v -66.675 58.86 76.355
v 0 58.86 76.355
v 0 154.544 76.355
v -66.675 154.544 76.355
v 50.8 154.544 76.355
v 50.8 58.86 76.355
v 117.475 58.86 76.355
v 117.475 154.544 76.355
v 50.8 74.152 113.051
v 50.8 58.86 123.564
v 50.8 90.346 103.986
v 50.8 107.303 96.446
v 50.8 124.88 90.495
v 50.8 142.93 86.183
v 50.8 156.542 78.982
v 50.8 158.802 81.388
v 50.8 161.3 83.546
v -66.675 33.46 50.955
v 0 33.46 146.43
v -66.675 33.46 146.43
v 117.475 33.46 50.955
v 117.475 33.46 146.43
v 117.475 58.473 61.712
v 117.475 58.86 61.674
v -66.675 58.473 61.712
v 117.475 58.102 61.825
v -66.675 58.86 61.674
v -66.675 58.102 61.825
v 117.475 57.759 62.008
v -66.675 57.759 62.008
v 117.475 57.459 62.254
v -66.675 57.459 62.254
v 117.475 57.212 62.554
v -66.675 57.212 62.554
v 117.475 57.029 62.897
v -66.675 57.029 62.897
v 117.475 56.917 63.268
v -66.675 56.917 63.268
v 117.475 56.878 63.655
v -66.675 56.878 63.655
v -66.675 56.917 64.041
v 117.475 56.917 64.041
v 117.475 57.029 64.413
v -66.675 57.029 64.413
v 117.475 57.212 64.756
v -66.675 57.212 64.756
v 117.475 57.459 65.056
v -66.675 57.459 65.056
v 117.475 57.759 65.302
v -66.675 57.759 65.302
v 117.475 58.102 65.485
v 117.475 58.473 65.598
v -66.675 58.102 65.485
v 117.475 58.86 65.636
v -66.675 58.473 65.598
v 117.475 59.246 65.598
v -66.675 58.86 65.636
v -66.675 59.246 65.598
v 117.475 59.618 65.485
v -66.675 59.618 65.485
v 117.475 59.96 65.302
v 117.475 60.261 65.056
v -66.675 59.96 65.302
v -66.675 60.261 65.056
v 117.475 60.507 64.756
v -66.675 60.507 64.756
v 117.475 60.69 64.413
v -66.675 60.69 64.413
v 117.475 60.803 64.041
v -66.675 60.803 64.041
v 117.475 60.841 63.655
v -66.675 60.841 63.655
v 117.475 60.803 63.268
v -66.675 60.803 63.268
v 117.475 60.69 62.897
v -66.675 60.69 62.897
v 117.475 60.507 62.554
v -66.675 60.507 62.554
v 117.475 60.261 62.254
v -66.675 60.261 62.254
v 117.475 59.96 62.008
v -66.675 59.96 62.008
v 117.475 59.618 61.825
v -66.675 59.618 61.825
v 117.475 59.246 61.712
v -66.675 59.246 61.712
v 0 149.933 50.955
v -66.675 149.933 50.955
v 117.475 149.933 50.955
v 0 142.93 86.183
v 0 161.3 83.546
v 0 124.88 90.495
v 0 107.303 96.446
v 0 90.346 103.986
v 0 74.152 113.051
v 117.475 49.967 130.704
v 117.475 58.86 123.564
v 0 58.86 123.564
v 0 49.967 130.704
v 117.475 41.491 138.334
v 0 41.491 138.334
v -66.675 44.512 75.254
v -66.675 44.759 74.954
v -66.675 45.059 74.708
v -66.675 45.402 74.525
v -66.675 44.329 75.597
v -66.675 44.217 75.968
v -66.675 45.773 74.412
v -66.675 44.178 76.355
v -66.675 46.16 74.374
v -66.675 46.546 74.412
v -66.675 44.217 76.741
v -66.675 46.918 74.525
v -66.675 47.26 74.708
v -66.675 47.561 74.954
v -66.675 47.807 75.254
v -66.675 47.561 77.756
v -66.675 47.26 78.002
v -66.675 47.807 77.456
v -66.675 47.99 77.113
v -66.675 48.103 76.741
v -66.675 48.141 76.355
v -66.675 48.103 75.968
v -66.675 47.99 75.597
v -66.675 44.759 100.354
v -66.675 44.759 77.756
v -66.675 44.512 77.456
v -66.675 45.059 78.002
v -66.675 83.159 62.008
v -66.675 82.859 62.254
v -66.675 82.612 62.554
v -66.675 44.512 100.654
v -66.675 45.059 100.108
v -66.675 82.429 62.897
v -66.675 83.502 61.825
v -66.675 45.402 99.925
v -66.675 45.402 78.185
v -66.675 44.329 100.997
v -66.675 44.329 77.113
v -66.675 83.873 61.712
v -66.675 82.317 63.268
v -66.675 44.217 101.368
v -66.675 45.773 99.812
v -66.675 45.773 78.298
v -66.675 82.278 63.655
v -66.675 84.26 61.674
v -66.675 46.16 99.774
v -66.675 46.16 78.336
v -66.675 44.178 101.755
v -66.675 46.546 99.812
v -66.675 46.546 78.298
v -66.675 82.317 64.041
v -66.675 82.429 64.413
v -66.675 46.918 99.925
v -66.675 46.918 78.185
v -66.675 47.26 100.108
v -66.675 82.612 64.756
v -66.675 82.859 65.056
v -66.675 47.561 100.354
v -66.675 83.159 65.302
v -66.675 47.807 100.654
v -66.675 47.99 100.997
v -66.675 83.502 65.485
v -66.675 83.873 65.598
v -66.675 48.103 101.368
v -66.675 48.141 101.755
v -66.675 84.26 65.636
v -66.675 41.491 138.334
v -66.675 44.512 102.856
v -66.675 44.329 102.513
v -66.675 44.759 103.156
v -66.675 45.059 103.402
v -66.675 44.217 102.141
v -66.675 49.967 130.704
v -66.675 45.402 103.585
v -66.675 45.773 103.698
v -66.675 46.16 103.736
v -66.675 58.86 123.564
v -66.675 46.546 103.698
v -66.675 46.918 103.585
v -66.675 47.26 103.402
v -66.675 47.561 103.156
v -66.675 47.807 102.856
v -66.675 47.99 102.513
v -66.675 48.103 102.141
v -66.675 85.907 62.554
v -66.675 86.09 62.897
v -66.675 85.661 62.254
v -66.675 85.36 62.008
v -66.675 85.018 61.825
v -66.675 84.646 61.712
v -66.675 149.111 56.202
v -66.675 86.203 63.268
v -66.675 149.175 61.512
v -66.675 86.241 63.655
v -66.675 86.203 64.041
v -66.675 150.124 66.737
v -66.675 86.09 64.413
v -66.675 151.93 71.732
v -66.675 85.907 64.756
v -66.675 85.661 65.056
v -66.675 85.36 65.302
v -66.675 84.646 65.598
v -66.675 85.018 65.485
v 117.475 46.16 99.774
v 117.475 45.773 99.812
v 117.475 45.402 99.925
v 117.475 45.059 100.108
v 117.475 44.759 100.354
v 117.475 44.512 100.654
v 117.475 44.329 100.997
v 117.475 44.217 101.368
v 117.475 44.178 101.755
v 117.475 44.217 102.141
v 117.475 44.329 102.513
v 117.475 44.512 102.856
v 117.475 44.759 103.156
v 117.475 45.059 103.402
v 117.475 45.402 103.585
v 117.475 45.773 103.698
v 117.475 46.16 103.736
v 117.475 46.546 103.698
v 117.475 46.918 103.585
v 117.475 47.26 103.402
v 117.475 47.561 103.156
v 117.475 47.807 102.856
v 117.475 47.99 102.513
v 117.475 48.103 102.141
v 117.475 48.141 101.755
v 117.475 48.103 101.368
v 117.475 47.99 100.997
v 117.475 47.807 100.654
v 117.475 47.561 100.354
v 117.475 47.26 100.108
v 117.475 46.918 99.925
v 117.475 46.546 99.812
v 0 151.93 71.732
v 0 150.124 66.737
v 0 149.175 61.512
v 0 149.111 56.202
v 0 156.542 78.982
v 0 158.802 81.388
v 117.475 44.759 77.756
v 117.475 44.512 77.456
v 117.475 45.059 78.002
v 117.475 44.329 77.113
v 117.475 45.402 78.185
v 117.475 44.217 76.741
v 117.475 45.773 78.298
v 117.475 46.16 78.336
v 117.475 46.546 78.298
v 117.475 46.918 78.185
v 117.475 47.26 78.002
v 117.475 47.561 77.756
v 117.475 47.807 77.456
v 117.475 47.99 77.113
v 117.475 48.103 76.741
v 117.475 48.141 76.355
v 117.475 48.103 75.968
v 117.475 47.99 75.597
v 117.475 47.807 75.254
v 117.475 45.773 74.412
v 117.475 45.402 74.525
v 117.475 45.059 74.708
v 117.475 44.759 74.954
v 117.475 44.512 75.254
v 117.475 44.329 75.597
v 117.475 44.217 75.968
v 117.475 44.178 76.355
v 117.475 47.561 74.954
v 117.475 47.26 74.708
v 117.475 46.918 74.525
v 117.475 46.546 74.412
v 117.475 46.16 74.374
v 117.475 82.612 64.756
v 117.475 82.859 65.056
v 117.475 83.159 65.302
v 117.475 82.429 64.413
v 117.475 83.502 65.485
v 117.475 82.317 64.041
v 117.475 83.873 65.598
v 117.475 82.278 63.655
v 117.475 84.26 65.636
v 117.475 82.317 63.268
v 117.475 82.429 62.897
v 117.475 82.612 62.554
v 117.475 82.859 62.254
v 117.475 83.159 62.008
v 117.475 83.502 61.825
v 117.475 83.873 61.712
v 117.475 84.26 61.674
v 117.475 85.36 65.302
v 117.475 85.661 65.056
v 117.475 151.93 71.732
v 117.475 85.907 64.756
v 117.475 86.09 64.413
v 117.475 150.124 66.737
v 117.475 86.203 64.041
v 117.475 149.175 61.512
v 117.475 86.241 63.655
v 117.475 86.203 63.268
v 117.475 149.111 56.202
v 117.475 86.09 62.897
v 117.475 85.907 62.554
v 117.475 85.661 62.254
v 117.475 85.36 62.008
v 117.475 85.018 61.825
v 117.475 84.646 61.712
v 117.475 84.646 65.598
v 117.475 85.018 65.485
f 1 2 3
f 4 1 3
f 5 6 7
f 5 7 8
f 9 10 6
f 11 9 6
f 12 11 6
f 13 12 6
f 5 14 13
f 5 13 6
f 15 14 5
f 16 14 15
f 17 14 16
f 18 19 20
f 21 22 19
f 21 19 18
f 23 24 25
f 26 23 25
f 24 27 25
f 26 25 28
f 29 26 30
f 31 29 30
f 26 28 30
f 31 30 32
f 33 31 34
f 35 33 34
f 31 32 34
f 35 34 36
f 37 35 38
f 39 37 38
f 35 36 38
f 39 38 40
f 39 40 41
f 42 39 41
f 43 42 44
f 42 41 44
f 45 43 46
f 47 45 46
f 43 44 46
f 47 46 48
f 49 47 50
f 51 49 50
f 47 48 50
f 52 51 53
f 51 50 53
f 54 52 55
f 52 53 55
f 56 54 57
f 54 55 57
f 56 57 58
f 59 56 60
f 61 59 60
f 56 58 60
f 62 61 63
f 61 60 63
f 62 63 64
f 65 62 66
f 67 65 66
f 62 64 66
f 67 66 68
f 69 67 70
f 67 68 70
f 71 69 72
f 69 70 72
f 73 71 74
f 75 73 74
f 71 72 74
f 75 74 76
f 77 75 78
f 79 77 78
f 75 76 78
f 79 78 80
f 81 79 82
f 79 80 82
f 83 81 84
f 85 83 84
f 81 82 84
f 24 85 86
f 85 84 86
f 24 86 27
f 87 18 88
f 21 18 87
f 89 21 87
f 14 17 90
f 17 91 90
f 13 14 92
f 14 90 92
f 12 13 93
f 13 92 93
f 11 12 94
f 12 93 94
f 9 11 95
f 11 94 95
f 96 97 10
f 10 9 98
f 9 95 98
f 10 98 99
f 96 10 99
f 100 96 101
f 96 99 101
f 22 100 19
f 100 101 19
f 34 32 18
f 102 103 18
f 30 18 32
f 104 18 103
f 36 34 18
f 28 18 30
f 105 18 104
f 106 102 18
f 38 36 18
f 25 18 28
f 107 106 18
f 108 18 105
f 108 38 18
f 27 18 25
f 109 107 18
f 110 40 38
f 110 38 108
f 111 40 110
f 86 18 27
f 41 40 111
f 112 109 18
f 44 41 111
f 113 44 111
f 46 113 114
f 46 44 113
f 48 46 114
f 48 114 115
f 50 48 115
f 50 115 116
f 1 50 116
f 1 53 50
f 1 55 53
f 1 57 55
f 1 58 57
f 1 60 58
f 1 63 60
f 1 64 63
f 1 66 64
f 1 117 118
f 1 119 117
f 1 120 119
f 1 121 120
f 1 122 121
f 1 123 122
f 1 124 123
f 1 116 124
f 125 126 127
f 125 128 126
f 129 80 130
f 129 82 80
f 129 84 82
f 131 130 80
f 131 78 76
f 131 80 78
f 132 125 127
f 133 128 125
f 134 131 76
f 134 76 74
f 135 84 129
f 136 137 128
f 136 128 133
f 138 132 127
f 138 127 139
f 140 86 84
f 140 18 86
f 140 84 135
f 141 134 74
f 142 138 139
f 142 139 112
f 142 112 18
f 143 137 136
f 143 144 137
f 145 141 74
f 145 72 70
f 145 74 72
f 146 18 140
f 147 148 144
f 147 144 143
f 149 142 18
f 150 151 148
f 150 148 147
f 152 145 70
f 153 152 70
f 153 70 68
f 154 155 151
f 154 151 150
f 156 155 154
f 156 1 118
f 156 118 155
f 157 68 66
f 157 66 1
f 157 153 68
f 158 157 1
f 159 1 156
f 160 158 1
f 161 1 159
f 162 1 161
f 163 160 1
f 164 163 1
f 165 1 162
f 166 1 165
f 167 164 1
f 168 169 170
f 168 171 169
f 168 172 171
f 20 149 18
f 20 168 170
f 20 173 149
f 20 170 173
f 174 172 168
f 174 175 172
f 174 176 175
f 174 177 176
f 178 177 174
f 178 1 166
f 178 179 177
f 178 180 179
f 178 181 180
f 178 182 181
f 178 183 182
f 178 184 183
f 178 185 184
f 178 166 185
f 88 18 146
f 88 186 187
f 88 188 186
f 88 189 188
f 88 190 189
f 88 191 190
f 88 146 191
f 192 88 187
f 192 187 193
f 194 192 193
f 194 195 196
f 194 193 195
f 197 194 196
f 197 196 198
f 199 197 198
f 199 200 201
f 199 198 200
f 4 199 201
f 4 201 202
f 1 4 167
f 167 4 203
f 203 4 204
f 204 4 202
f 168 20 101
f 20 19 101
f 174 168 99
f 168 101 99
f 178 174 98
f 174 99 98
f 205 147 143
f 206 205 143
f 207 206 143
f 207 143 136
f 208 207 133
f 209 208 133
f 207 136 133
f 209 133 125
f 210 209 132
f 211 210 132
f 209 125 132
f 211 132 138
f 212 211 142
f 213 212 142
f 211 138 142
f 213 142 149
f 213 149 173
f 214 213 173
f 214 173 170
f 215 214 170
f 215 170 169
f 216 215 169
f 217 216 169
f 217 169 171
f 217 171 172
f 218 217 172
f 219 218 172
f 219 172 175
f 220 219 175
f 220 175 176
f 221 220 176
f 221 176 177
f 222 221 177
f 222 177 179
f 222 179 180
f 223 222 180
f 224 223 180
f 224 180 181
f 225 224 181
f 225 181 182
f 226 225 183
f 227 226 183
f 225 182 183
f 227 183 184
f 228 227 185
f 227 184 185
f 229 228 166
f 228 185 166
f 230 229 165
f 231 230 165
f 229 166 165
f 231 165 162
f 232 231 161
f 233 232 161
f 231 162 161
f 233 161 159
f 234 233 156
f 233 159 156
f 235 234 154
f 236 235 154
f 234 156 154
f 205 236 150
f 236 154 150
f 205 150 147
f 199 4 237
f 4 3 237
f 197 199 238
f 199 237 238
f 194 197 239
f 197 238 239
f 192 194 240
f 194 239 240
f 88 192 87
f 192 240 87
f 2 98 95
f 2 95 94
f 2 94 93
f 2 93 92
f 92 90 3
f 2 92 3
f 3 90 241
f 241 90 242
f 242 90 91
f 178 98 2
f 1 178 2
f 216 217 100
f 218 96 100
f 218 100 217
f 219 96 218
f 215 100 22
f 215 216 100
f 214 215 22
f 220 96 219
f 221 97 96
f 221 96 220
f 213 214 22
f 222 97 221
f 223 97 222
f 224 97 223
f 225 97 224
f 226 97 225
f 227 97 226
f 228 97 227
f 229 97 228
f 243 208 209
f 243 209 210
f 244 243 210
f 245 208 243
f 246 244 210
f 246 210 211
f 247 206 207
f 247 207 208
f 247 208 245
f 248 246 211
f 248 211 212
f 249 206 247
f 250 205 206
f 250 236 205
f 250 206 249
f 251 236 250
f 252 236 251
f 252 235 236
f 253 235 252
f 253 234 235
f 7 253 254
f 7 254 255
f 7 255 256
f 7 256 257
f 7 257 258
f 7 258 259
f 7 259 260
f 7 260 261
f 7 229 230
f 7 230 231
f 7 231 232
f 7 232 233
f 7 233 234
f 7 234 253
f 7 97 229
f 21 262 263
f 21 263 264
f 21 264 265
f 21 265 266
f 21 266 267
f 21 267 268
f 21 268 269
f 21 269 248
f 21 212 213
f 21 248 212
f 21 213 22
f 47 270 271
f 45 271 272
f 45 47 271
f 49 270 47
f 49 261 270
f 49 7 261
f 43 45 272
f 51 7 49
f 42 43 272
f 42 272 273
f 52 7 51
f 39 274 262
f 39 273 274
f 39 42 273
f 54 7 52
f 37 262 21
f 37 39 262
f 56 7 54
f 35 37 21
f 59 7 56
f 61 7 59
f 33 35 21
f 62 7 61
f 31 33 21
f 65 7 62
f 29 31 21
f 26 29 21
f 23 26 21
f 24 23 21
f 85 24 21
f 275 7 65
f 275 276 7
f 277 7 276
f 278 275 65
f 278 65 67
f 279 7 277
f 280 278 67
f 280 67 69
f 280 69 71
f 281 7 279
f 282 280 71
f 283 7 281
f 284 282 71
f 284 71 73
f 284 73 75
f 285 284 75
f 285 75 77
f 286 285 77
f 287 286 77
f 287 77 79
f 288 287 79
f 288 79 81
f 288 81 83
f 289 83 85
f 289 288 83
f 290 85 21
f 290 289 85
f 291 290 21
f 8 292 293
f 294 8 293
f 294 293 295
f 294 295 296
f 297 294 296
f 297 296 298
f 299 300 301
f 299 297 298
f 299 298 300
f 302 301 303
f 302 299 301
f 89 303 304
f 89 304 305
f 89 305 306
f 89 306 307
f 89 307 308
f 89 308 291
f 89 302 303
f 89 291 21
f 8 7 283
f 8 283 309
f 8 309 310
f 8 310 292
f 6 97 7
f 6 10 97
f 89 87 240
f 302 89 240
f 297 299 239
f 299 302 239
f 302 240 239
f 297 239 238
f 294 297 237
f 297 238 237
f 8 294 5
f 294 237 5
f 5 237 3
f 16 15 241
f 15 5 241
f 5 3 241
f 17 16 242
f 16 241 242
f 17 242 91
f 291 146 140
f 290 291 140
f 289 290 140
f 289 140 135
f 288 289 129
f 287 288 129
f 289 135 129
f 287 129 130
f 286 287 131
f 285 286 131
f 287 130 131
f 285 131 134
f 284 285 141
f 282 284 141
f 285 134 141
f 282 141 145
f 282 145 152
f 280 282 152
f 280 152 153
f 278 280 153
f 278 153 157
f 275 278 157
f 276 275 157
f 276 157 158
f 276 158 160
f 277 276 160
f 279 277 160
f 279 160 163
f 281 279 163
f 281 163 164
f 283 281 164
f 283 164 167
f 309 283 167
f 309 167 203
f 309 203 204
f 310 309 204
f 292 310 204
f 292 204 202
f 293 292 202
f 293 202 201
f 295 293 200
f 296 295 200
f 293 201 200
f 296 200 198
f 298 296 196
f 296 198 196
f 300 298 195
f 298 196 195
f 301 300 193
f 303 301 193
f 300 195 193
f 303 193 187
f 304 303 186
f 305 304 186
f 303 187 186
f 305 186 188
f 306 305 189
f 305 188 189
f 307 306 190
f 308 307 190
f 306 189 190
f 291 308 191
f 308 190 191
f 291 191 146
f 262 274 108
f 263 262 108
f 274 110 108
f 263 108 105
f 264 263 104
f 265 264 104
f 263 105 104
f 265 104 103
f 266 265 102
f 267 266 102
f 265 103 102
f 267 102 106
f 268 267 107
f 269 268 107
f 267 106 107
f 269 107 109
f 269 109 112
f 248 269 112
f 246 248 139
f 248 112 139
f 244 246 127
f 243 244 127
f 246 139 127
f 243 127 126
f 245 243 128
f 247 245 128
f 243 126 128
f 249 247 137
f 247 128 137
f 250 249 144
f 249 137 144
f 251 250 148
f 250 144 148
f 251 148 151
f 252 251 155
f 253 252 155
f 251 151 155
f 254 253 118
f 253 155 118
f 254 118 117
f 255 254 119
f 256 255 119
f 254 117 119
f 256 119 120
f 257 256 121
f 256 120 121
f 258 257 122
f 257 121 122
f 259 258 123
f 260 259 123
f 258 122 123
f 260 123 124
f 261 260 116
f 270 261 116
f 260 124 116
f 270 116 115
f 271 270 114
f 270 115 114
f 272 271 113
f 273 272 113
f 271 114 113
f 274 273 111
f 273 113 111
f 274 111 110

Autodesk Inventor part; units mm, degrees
ref_plane "YZ Plane" through (0, 0, 0) normal (1, 0, 0) x (0, 1, 0)
ref_plane "XZ Plane" through (0, 0, 0) normal (0, 1, 0) x (-1, 0, 0)
ref_plane "XY Plane" through (0, 0, 0) normal (0, 0, 1) x (1, 0, 0)
sketch "Sketch1" plane through (0, 0, 0) normal (1, 0, 0) x (0, 1, 0)
  circle A0 centre (180.7797, 284.5338) radius 25.4
  line L0 (-17.3403, 309.9338) -> (-51.2615, 309.9338)
  line L1 (-51.2615, 309.9338) -> (-51.2615, -502.8662)
  line L2 (-51.2615, -502.8662) -> (-17.3403, -502.8662)
  line L3 (-17.3403, -502.8662) -> (-17.3403, 309.9338)
  line L4 (33.4597, 146.4304) -> (33.4597, 50.9549)
  arc A1 (202.8525, 71.0418) -> (198.1508, 77.005) centre (180.7797, 58.4738) ccw
  line L5 (198.1508, 7.6738) -> (231.5797, 7.6738)
  line L6 (231.5797, 7.6738) -> (231.5797, 309.9338)
  line L7 (231.5797, 309.9338) -> (33.4597, 309.9338)
  line L8 (33.4597, 146.4304) -> (33.4597, 50.9549)
  line L9 (198.1508, 76.3549) -> (198.1508, 50.9549)
  line L10 (33.4597, 50.9549) -> (33.4597, 76.3549)
  line L11 (33.4597, 50.9549) -> (58.8597, 50.9549)
  line L12 (33.4597, 119.3221) -> (33.4597, 50.9549)
  line L13 (149.9329, 50.9549) -> (33.4597, 50.9549)
  arc A2 (231.5797, 89.0982) -> (-17.3403, 245.4929) centre (180.7797, 284.5338) ccw
  arc A3 (33.4597, 146.4304) -> (161.2998, 83.5456) centre (180.7797, 284.5338) ccw
  arc A4 (161.2998, 83.5456) -> (149.9329, 50.9549) centre (180.7797, 58.4738) ccw
  arc A5 (198.1508, 70.6079) -> (202.8525, 71.0418) centre (180.7797, 284.5338) ccw
  arc A6 (231.5797, 76.0023) -> (-17.3403, 201.9838) centre (180.7797, 284.5338) ccw
  point P0 (0, 0)
  dimension "d1" = 50.8
  dimension "d2" = 812.8
  dimension "d5" = 25.4
  dimension "d6" = 198.12
  dimension "d10" = 50.8
  dimension "d11" = 50.8
  dimension "d12" = 226.06
  dimension "d15" = 25.4
  dimension "d16" = 50.8
  dimension "d17" = 302.26
  dimension "d18" = 50.8
extrude "Extrusion1" add sketch "Sketch1" along normal blind 50.8 contours A3 A4 L13 L11 L4
sketch "Sketch2" plane through (50.8, 0, 0) normal (1, 0, 0) x (0, 0, -1)
  line L0 (-146.4304, 33.4597) -> (-50.9549, 33.4597) projected
  line L1 (-50.9549, 33.4597) -> (-146.4304, 33.4597)
  line L2 (-123.5641, 58.8597) -> (-76.3549, 58.8597)
  line L3 (-50.9549, 58.8597) -> (-50.9549, 33.4597)
  line L4 (-50.9549, 33.4597) -> (-76.3549, 33.4597)
  line L5 (-76.3549, 58.8597) -> (-76.3549, 154.5437)
  line L6 (-50.9549, 149.9329) -> (-50.9549, 33.4597)
  arc A0 (-146.4304, 33.4597) -> (-83.5456, 161.2998) centre (-284.5338, 180.7797) ccw projected
  arc A1 (-83.5456, 161.2998) -> (-50.9549, 149.9329) centre (-58.4738, 180.7797) ccw projected
  line L7 (-50.9549, 33.4597) -> (-50.9549, 149.9329) projected
  arc A2 (-76.3549, 154.5437) -> (-50.9549, 149.9329) centre (-58.4738, 180.7797) ccw
  arc A3 (-146.4304, 33.4597) -> (-123.5641, 58.8597) centre (-284.5338, 180.7797) ccw
  point P0 (0, 0)
  dimension "d30" = 25.4
  dimension "d31" = 25.4
extrude "Extrusion2" add sketch "Sketch2" along normal blind 66.675 contours A0 L2 L5 A1 L6 L3 L0
sketch "Sketch3" plane through (0, 0, 0) normal (-1, 0, 0) x (0, 0, 1)
  line L0 (76.3549, 58.8597) -> (76.3549, 154.5437) projected
  arc A0 (50.9549, 149.9329) -> (83.5456, 161.2998) centre (58.4738, 180.7797) ccw projected
  line L1 (50.9549, 33.4597) -> (50.9549, 149.9329) projected
  line L2 (146.4304, 33.4597) -> (50.9549, 33.4597) projected
  arc A1 (83.5456, 161.2998) -> (146.4304, 33.4597) centre (284.5338, 180.7797) ccw projected
  line L3 (123.5641, 58.8597) -> (76.3549, 58.8597) projected
  line L4 (76.3549, 154.5437) -> (76.3549, 58.8597) projected
  line L5 (76.3549, 154.5437) -> (76.3549, 58.8597)
  line L6 (76.3549, 58.8597) -> (123.5641, 58.8597)
  line L7 (50.9549, 149.9329) -> (50.9549, 33.4597)
  line L8 (146.4304, 33.4597) -> (50.9549, 33.4597)
  arc A2 (50.9549, 149.9329) -> (76.3549, 154.5437) centre (58.4738, 180.7797) ccw
  arc A3 (123.5641, 58.8597) -> (146.4304, 33.4597) centre (284.5338, 180.7797) ccw
  point P0 (0, 0)
extrude "Extrusion3" add sketch "Sketch3" along normal blind 66.675 contours L3 A1 L2 L1 A0 L0
sketch "Sketch4" plane through (117.475, 0, 0) normal (1, 0, 0) x (0, 0, -1)
  line L0 (-146.4304, 33.4597) -> (-50.9549, 33.4597) projected
  line L1 (-50.9549, 33.4597) -> (-50.9549, 149.9329) projected
  point P0 (0, 0)
  point P1 (-76.3549, 46.1597)
  point P2 (-101.7549, 46.1597)
  point P3 (-63.6549, 58.8597)
  point P4 (-63.6549, 84.2597)
  dimension "d36" = 0
  dimension "d37" = 25.4
  dimension "d38" = 25.4
  dimension "d39" = 0
  dimension "d40" = 25.4
  dimension "d41" = 25.4
  dimension "d42" = 12.7
  dimension "d43" = 12.7
hole "Hole1" at (117.475, 46.1597, 76.3549) at (117.475, 46.1597, 101.7549) at (117.475, 58.8597, 63.6549) at (117.475, 84.2597, 63.6549) direction (-1, 0, 0) diameter 3.9624 end through all thread size "10-32 UNF" class "2B" standard "ANSI Unified Screw Threads"
properties part number "BottomRamp"
